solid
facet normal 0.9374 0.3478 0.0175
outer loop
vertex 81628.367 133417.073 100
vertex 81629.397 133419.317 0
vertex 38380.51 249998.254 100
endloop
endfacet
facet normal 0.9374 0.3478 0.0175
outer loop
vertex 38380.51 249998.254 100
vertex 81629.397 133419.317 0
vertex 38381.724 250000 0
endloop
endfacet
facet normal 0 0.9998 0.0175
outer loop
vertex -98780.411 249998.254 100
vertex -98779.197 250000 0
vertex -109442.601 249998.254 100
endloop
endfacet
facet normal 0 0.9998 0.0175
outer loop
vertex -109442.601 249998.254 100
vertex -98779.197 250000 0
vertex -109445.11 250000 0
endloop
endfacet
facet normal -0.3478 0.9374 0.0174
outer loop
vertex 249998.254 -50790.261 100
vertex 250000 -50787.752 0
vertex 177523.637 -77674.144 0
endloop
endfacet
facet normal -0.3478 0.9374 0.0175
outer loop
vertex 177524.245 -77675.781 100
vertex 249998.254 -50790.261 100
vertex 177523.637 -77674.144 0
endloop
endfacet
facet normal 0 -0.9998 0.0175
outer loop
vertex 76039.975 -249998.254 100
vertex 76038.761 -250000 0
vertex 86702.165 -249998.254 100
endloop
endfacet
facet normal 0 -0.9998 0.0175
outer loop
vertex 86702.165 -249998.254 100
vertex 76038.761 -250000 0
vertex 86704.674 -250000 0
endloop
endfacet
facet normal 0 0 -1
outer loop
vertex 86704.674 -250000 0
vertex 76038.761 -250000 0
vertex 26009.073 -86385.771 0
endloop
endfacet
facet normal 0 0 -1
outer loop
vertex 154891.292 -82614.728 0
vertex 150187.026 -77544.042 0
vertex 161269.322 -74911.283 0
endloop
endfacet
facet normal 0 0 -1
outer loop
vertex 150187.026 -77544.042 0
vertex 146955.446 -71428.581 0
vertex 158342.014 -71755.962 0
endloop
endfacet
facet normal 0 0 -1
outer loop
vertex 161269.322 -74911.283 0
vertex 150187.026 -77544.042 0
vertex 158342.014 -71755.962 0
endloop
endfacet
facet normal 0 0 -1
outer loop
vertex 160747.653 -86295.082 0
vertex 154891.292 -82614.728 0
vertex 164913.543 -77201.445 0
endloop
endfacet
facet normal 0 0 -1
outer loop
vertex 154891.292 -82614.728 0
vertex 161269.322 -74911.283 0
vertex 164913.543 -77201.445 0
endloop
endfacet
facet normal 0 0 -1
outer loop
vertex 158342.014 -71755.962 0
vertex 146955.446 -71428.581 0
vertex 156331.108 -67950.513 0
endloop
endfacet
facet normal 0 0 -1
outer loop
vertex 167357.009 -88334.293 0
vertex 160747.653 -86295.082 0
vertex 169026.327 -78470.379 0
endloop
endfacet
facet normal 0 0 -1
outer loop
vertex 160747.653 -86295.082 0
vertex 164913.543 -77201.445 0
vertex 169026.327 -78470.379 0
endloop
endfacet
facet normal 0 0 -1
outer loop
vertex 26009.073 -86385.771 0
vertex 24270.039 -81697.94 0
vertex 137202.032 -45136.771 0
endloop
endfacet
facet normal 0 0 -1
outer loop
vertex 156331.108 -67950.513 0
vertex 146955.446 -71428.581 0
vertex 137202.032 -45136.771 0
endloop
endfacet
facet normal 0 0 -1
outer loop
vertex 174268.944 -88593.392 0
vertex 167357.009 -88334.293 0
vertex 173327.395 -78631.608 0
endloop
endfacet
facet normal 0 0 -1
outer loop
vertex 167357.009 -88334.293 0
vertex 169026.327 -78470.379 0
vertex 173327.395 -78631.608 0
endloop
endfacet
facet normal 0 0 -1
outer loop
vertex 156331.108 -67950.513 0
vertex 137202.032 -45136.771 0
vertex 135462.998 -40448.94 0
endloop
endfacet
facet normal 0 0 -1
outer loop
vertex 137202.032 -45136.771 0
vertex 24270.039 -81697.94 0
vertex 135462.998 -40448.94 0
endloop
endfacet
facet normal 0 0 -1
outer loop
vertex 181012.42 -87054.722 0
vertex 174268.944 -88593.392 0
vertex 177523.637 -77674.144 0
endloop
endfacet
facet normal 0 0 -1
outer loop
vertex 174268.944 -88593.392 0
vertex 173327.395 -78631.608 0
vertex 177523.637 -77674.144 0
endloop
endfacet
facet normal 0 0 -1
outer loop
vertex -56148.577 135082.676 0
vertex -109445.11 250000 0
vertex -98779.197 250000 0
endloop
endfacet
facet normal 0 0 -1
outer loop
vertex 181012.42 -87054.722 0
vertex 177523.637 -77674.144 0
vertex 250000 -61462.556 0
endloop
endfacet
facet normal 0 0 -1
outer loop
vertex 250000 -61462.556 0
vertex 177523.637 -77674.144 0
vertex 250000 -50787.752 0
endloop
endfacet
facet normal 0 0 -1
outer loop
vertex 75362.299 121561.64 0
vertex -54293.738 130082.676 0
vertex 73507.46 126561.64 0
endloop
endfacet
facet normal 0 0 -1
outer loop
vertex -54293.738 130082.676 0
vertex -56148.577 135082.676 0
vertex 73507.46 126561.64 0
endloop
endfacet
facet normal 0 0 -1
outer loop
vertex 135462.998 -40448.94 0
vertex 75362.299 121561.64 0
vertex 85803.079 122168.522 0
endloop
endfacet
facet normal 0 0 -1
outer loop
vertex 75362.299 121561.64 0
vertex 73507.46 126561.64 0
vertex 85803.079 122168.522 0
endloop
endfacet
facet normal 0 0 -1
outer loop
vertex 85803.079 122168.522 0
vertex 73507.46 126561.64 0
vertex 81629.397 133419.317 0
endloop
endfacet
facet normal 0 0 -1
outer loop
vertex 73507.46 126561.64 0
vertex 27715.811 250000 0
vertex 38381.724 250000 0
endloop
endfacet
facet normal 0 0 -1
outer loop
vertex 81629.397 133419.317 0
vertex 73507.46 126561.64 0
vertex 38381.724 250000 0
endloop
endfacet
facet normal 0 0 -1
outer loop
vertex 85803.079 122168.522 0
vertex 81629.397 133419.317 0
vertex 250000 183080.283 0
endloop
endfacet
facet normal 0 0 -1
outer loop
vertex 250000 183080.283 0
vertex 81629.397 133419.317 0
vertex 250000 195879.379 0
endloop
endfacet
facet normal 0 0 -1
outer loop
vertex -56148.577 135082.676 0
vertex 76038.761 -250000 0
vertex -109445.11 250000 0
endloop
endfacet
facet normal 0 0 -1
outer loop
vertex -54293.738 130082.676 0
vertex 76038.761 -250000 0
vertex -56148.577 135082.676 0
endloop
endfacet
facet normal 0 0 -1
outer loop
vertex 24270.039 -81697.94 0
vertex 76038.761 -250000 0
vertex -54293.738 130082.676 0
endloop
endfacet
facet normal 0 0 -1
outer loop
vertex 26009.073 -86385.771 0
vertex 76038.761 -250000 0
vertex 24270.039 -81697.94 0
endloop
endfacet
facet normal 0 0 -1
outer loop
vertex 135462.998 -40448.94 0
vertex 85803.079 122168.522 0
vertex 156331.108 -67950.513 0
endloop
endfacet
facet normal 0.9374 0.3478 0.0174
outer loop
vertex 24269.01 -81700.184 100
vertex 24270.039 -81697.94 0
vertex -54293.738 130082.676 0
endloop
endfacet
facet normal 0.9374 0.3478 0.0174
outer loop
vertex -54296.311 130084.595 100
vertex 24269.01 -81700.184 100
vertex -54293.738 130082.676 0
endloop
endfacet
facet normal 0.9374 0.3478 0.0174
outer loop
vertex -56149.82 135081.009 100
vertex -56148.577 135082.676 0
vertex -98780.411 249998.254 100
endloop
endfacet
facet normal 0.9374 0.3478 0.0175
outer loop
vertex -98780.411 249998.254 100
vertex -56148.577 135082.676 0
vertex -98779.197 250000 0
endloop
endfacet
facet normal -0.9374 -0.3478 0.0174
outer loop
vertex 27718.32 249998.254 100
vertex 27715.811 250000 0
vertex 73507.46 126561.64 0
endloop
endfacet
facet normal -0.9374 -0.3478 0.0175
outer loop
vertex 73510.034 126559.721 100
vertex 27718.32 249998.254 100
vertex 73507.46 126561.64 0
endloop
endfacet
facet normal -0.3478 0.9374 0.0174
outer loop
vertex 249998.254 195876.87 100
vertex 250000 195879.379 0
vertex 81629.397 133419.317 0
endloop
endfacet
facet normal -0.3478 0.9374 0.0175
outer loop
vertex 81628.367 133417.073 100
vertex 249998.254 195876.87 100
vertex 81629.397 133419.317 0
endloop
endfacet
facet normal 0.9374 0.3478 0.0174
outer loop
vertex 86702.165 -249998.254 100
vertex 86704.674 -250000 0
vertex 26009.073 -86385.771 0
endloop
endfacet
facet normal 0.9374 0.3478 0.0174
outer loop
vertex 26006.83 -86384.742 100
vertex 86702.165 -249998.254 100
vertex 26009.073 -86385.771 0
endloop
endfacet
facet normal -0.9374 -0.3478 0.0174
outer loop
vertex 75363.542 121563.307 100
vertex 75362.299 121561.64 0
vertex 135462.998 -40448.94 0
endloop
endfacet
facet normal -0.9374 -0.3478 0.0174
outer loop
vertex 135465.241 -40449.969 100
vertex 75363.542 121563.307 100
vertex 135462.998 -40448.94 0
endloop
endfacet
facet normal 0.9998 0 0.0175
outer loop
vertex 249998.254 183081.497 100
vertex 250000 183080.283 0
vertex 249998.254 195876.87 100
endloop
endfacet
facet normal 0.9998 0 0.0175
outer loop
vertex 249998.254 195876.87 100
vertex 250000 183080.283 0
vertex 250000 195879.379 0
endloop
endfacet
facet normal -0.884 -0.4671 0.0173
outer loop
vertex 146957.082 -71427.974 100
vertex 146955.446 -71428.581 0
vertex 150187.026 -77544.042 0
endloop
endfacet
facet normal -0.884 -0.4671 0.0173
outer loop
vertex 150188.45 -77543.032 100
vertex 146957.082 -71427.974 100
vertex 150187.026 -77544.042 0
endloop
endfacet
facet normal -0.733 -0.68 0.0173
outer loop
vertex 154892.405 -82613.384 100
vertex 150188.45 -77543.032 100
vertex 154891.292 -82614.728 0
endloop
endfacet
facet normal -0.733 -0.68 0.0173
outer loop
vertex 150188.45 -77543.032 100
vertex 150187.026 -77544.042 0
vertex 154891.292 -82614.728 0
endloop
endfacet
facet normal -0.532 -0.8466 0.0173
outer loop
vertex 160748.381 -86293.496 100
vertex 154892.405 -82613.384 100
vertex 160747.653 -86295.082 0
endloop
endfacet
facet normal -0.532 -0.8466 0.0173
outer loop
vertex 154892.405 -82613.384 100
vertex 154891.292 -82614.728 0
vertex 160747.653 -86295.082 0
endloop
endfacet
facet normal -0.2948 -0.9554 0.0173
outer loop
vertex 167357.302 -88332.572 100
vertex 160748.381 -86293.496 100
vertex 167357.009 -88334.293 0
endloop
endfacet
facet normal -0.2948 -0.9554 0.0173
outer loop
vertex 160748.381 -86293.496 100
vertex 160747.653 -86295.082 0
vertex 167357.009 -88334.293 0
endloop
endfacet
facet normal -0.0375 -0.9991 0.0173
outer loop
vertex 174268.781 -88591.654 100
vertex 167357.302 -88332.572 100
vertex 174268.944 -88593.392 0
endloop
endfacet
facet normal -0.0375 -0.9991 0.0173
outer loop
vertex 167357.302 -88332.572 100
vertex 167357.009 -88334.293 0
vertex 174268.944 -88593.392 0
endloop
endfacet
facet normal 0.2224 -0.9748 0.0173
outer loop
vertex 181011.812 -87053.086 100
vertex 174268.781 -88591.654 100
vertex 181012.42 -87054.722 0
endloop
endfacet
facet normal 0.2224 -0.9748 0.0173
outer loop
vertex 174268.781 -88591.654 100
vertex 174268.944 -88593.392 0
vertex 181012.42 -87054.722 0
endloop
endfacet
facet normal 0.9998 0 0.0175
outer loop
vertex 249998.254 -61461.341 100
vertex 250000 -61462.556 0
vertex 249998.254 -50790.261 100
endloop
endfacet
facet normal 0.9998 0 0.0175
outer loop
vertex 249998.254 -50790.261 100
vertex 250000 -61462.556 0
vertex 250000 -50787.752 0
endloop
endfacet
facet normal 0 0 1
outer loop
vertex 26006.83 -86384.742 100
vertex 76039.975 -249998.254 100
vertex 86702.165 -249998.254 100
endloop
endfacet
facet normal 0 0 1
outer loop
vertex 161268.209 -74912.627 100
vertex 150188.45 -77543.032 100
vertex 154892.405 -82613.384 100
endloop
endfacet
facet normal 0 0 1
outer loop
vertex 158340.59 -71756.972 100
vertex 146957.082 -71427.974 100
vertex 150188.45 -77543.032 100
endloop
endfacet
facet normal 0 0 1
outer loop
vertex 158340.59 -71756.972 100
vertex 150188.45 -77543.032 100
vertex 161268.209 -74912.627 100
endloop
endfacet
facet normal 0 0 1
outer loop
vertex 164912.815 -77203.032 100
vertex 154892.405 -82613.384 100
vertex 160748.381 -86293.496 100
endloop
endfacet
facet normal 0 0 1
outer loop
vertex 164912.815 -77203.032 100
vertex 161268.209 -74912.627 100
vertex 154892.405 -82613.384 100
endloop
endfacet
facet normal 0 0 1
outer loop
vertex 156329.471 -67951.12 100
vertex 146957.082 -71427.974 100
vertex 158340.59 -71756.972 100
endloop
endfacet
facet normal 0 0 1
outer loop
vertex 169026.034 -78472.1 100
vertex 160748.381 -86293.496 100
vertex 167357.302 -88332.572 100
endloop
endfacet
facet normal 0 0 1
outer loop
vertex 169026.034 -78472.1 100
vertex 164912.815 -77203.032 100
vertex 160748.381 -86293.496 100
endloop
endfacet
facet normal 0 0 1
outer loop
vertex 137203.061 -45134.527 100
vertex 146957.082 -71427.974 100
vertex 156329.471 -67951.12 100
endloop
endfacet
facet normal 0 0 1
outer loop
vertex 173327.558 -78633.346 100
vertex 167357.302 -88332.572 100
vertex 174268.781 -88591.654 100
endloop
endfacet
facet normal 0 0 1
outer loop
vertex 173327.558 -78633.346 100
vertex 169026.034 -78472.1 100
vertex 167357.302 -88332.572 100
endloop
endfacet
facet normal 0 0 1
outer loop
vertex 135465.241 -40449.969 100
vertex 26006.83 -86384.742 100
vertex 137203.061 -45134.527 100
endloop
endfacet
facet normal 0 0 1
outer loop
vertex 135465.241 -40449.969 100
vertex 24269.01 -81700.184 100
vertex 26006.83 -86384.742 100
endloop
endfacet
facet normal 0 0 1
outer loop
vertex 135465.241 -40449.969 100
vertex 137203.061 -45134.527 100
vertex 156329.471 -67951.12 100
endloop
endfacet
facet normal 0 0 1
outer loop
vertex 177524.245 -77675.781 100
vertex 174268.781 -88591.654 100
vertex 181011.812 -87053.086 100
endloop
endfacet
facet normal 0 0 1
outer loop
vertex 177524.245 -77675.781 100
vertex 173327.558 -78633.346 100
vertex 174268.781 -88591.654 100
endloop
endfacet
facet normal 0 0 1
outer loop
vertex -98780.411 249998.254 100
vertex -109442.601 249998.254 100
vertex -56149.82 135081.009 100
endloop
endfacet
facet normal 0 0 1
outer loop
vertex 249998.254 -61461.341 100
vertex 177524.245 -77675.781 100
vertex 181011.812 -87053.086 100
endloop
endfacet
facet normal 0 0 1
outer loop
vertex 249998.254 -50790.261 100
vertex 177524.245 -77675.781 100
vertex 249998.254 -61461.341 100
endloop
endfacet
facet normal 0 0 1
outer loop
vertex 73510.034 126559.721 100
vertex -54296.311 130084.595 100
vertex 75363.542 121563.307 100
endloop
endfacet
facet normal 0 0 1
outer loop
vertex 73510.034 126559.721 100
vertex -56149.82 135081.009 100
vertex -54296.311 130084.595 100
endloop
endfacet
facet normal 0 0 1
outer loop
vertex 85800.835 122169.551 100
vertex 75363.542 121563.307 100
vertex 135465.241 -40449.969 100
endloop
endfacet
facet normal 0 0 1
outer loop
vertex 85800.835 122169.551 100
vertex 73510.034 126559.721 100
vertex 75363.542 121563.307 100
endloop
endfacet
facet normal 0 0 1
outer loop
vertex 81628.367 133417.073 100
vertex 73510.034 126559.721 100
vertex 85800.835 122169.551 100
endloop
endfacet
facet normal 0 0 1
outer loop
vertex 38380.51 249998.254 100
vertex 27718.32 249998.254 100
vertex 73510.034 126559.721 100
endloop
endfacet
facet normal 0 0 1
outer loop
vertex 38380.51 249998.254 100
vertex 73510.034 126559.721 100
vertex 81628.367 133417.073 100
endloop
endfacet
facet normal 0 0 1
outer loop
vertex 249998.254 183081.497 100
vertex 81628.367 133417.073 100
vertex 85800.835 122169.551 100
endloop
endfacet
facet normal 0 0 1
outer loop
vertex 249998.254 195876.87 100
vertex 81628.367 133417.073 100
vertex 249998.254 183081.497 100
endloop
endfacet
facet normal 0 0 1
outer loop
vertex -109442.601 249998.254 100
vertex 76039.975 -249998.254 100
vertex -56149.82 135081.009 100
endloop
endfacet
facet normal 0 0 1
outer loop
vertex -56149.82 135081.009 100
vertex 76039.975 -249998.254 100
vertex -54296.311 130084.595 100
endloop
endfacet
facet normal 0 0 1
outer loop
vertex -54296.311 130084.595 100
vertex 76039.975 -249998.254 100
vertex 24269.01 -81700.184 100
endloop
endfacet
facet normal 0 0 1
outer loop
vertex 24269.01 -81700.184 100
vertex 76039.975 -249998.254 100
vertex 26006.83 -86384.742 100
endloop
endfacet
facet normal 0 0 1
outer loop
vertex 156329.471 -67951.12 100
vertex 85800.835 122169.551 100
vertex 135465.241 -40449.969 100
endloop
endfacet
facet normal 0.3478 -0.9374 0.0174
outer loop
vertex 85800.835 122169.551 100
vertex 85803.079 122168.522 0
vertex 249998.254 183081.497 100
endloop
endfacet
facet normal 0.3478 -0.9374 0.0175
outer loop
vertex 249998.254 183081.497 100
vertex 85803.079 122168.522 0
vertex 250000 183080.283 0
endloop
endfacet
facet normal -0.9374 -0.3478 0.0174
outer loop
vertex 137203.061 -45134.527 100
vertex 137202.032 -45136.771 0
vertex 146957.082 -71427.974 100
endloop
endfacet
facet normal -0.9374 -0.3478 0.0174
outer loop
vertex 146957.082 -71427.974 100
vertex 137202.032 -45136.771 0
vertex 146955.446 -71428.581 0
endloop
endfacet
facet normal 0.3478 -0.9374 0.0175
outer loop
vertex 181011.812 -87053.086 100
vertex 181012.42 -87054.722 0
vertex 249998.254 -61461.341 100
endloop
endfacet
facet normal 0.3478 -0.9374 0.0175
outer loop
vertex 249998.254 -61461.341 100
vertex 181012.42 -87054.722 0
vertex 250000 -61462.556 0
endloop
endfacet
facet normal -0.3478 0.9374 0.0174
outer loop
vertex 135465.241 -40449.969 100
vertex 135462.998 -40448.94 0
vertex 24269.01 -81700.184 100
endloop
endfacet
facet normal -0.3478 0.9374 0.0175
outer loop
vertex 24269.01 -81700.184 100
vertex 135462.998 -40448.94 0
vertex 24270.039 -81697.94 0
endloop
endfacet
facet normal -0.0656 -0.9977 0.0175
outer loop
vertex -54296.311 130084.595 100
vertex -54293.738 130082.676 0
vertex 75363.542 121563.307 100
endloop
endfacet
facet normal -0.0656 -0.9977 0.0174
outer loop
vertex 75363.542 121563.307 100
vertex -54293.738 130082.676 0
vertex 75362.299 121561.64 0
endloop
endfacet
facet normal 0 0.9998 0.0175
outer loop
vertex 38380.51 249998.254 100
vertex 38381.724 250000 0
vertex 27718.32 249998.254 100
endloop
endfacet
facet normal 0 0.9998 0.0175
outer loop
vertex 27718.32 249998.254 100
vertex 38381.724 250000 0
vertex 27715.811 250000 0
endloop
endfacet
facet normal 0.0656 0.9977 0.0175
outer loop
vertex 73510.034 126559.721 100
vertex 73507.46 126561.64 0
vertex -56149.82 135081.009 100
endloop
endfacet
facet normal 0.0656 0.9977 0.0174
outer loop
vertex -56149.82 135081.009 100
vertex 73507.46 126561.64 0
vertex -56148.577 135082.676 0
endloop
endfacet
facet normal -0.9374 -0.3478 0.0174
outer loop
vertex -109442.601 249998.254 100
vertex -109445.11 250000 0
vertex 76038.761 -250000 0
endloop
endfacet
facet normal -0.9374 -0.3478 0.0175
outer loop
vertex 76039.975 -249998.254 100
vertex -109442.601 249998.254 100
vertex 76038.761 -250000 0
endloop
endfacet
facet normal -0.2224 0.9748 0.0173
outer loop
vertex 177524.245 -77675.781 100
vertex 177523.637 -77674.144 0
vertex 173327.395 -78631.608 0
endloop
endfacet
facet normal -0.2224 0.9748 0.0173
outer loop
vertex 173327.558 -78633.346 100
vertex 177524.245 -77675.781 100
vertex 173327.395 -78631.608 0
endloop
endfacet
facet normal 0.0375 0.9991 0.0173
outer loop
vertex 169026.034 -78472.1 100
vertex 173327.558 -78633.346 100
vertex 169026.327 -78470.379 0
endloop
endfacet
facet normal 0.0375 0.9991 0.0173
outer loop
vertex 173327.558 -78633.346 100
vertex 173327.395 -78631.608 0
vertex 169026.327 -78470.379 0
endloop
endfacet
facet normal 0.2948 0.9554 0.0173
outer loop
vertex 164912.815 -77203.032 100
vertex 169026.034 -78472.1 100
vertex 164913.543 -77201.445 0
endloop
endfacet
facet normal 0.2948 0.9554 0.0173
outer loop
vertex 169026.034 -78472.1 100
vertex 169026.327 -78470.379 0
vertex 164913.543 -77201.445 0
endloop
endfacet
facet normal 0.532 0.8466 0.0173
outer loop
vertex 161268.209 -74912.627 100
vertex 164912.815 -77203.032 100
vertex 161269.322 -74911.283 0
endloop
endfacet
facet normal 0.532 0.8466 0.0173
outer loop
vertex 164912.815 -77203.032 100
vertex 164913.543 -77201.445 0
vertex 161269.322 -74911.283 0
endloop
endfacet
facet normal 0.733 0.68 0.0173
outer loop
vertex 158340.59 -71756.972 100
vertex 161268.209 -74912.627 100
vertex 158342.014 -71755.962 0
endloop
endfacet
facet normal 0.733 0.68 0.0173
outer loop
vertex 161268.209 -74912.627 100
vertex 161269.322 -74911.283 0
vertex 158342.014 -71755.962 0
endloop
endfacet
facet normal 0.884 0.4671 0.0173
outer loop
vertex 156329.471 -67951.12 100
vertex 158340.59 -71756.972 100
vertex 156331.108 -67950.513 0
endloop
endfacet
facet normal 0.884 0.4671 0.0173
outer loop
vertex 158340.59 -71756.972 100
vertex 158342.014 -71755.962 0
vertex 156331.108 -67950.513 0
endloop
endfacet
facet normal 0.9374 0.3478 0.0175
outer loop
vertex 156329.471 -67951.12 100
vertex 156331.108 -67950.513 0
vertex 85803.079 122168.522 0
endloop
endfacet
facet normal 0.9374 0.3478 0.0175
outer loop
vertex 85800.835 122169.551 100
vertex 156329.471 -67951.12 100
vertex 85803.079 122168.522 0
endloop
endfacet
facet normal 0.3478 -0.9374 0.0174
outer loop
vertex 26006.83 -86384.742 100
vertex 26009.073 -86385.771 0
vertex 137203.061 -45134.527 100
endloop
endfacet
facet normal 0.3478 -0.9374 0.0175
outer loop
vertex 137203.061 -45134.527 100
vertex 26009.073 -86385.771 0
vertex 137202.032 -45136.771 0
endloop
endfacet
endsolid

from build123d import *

# Parameters (mm, degrees)
BOSS_EXTRUDE1_DEPTH = 100
BOSS_EXTRUDE1_DRAFT = 1


with BuildPart() as part:
    # Sketch2 → Boss-Extrude1 (with draft: the straight prism first)
    with BuildSketch(Plane.XY):
        with BuildLine():
            Line((-109445.109958414, 250000), (76038.761009331, -250000))
            Line((76038.761009331, -250000), (86704.674310857, -250000))
            Line((86704.674310857, -250000), (26009.073390173, -86385.771431203))
            Line((26009.073390173, -86385.771431203), (137202.031954441, -45136.770673489))
            Line((137202.031954441, -45136.770673489), (146955.445625558, -71428.581439109))
            ThreePointArc((146955.445625558, -71428.581439109), (160747.652847111, -86295.082195084), (181012.419598066, -87054.722438259))
            Line((181012.419598066, -87054.722438259), (250000, -61462.555514961))
            Line((250000, -61462.555514961), (250000, -50787.751916435))
            Line((250000, -50787.751916435), (177523.637472943, -77674.144466796))
            ThreePointArc((177523.637472943, -77674.144466796), (164913.542670162, -77201.445441923), (156331.107809657, -67950.513209524))
            Line((156331.107809657, -67950.513209524), (85803.078601765, 122168.522046532))
            Line((85803.078601765, 122168.522046532), (250000, 183080.283210395))
            Line((250000, 183080.283210395), (250000, 195879.379172226))
            Line((250000, 195879.379172226), (81629.396726262, 133419.316667451))
            Line((81629.396726262, 133419.316667451), (38381.72387709, 250000))
            Line((38381.72387709, 250000), (27715.810575564, 250000))
            Line((27715.810575564, 250000), (73507.460404044, 126561.639592795))
            Line((73507.460404044, 126561.639592795), (-56148.576586816, 135082.67633285))
            Line((-56148.576586816, 135082.67633285), (-98779.196656888, 250000))
            Line((-98779.196656888, 250000), (-109445.109958414, 250000))
        make_face()
        Polygon((-54293.737877138, 130082.67633285), (75362.299113722, 121561.639592795), (135462.997839648, -40448.93958144), (24270.039275381, -81697.940339153), align=None, mode=Mode.SUBTRACT)
    extrude(amount=BOSS_EXTRUDE1_DEPTH)
    # Boss-Extrude1: the draft: its side faces are tilted about the plane it starts from
    boss_extrude1_sides = [part.faces().sort_by_distance(p)[0] for p in [
        (-16703.174474542, 0, 50),
        (81371.717660094, -250000, 50),
        (56356.873850515, -168192.885715601, 50),
        (81605.552672307, -65761.271052346, 50),
        (142078.73879, -58282.676056299, 50),
        (160747.652847111, -86295.082195084, 50),
        (215506.209799033, -74258.63897661, 50),
        (250000, -56125.153715698, 50),
        (213761.818736472, -64230.948191616, 50),
        (164913.542670162, -77201.445441923, 50),
        (121067.093205711, 27109.004418504, 50),
        (167901.539300882, 152624.402628463, 50),
        (250000, 189479.83119131, 50),
        (165814.698363131, 164649.347919839, 50),
        (60005.560301676, 191709.658333726, 50),
        (33048.767226327, 250000, 50),
        (50611.635489804, 188280.819796397, 50),
        (8679.441908614, 130822.157962822, 50),
        (-77463.886621852, 192541.338166425, 50),
        (-104112.153307651, 250000, 50),
        (10534.280618292, 125822.157962822, 50),
        (105412.648476685, 40556.350005678, 50),
        (79866.518557515, -61073.439960296, 50),
        (-15011.849300879, 24192.367996849, 50),
    ]]
    draft(boss_extrude1_sides, Plane.XY, BOSS_EXTRUDE1_DRAFT)


solid = part.part
